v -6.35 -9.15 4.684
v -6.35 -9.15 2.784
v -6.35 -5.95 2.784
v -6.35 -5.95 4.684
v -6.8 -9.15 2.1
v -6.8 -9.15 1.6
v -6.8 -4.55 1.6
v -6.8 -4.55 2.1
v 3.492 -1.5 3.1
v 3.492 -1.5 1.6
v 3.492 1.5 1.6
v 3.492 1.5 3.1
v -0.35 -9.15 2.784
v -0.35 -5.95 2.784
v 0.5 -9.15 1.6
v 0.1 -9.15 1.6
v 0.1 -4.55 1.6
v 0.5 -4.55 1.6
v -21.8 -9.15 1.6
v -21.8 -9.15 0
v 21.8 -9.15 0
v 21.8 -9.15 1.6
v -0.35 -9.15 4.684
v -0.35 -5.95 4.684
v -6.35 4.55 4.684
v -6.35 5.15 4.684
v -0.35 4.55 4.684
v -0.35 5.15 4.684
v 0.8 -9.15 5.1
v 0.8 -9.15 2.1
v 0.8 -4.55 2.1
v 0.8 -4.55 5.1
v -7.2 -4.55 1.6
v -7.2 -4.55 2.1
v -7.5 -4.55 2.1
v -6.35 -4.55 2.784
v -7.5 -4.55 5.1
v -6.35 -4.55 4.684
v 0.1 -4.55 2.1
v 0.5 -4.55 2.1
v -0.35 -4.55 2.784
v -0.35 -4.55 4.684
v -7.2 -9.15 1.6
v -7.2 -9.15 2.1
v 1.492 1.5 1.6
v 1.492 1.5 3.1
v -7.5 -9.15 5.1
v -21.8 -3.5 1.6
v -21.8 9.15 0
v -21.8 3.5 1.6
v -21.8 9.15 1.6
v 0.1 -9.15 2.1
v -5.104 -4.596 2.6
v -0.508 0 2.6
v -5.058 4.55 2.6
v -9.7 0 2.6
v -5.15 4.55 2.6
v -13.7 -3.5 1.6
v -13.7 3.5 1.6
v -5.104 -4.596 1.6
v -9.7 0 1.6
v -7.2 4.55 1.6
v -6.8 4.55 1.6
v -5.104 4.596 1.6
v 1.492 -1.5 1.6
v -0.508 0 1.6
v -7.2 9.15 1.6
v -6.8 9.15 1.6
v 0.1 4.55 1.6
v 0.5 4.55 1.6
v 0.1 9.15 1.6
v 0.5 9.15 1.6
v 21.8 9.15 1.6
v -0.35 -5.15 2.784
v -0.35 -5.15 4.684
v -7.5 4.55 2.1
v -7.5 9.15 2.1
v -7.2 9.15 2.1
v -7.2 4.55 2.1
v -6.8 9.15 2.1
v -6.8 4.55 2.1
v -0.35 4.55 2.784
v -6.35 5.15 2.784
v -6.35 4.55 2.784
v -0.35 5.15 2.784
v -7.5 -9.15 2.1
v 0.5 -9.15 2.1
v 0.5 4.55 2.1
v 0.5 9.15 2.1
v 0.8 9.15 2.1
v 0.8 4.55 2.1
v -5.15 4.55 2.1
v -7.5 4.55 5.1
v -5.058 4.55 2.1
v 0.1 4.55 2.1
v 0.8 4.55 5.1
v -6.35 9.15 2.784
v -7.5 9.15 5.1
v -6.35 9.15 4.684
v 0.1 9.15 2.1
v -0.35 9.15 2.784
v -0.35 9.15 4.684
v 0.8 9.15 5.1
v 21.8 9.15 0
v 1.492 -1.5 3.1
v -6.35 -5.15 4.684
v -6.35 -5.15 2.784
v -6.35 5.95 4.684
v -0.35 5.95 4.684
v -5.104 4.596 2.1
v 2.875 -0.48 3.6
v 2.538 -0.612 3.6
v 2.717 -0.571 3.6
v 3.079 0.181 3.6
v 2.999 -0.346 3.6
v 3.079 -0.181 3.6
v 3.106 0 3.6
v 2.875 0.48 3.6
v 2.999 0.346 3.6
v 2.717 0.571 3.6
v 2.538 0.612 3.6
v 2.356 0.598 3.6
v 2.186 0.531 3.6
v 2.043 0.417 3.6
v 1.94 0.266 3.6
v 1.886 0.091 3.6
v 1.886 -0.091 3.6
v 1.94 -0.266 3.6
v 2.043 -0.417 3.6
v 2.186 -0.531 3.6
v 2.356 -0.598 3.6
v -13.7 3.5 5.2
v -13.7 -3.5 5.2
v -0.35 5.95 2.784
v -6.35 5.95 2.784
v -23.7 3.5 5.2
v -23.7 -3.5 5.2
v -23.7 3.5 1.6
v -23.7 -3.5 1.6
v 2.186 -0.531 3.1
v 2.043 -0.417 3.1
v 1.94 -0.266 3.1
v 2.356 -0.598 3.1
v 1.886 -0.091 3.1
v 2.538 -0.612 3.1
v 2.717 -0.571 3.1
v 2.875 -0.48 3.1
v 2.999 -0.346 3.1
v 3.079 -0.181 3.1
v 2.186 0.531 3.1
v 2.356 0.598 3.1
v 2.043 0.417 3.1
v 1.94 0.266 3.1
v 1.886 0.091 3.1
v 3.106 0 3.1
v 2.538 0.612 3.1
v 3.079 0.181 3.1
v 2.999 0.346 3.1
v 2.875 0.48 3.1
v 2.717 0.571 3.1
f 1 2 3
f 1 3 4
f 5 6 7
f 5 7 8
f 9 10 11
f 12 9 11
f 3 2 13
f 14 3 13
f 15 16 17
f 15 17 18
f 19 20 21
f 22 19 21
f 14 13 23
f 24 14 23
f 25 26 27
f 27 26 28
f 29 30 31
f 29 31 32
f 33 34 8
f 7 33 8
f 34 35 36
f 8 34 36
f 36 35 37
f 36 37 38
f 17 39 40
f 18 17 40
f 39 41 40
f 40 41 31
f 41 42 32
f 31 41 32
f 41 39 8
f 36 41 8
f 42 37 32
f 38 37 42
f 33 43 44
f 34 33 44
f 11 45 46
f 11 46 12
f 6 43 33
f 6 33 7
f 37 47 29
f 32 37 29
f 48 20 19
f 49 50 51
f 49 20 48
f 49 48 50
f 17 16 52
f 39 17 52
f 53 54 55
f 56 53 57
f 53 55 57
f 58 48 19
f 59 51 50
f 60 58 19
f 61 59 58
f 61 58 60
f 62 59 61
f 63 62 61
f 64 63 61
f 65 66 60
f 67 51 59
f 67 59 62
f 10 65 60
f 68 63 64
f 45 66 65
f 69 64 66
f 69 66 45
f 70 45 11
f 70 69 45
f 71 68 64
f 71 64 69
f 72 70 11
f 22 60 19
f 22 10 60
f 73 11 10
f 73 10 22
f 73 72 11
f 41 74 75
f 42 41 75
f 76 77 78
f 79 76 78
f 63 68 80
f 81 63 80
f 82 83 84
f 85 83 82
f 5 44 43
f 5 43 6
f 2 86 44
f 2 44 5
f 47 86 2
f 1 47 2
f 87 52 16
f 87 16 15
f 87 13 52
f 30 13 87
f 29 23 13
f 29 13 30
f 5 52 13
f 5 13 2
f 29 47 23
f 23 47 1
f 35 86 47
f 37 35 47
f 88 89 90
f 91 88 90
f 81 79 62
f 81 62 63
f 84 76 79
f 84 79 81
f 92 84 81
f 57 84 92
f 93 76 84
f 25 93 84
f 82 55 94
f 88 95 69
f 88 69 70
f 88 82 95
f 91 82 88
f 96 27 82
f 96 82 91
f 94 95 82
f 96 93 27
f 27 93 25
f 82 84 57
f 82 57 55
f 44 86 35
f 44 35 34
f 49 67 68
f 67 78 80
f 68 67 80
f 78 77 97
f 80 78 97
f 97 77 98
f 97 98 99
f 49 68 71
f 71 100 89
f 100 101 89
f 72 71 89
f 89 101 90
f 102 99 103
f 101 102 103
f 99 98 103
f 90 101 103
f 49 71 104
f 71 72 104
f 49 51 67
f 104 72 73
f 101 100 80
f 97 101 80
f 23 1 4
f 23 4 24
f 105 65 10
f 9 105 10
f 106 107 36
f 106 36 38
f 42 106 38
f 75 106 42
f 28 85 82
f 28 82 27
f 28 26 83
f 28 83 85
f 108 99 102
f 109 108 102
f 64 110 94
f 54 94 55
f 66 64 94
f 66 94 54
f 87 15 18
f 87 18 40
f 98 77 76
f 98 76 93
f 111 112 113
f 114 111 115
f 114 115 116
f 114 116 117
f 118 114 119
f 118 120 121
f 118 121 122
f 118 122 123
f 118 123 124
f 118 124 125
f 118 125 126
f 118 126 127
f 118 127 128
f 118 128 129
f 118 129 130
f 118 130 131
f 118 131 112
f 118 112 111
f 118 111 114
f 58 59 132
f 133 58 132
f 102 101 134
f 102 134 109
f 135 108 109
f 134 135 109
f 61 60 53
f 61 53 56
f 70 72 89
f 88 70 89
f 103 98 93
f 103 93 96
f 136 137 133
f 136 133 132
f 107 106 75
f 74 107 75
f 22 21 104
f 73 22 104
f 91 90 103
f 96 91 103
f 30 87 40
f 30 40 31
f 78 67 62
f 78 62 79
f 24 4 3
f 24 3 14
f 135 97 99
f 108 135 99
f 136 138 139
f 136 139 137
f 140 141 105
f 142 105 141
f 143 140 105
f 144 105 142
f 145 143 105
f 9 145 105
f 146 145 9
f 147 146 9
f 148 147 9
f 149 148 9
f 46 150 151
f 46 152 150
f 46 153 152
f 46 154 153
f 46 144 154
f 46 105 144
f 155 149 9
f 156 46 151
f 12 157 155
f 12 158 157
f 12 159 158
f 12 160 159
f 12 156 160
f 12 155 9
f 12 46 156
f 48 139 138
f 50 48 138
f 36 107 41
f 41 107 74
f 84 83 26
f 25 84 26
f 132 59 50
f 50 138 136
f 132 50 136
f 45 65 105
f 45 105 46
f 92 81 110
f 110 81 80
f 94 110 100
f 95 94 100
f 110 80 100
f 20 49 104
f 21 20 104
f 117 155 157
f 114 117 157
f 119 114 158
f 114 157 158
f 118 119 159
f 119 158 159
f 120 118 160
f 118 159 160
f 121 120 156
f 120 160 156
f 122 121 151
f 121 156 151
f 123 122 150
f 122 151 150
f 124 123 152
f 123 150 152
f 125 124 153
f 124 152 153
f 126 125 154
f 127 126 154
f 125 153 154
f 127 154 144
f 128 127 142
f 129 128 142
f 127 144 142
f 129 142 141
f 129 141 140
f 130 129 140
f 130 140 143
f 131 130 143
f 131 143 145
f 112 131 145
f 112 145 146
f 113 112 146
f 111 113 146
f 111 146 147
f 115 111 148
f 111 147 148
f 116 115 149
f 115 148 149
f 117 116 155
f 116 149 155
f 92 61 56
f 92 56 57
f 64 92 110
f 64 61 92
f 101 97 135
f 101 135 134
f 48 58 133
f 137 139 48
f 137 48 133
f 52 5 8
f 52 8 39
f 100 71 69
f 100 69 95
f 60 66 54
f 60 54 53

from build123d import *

# Parameters (mm, degrees)
SKETCH1_W            = 43.6
SKETCH1_H            = 18.3
BOSS_EXTRUDE1_DEPTH  = 1.6
USB_START            = 1.9
SKETCH2_W            = 3.6
SKETCH2_H            = 7
USB_CONNECTOR_DEPTH  = 10
MICROPROCESSOR_DEPTH = 1
SKETCH4_W            = 2
SKETCH4_H            = 3
BUTTON_BASE_DEPTH    = 1.5
SKETCH5_R            = 0.613578093
BUTTON_DEPTH         = 0.5
SKETCH6_W            = 8.3
SKETCH6_H            = 3
SKETCH6_W_2          = 6
SKETCH6_H_2          = 1.9
SKETCH6_W_3          = 0.4
SKETCH6_H_3          = 0.5
JST_X_6_DEPTH        = 4.6
BOSS_EXTRUDE8_START  = -4
SKETCH6_3_W          = 6
SKETCH6_3_H          = 1.9
BOSS_EXTRUDE8_DEPTH  = 0.8


with BuildPart() as part:
    # Sketch1 → Boss-Extrude1 (new body)
    with BuildSketch(Plane.XY):
        Rectangle(SKETCH1_W, SKETCH1_H)
    extrude(amount=BOSS_EXTRUDE1_DEPTH)

    # Sketch2 → USB Connector (add)
    with BuildSketch(Plane.ZY.offset(21.8).offset(USB_START)):
        with Locations((3.4, 0)):
            Rectangle(SKETCH2_W, SKETCH2_H)
    extrude(amount=-USB_CONNECTOR_DEPTH)

    # Sketch3 → MicroProcessor (add)
    with BuildSketch(Plane.XY.offset(1.6)):
        Polygon((-9.7, 0), (-5.103805922, 4.596194078), (-0.507611845, 0), (-5.103805922, -4.596194078), align=None)
    extrude(amount=MICROPROCESSOR_DEPTH)

    # Sketch4 → Button Base (add)
    with BuildSketch(Plane.XY.offset(1.6)):
        with Locations((2.492388155, 0)):
            Rectangle(SKETCH4_W, SKETCH4_H)
    extrude(amount=BUTTON_BASE_DEPTH)

    # Sketch5 → Button (add)
    with BuildSketch(Plane.XY.offset(3.1)):
        with Locations((2.492388155, 0)):
            Circle(SKETCH5_R)
    extrude(amount=BUTTON_DEPTH)


with BuildPart() as body_2:
    # Sketch6 → JST x 6 (new body)
    # profile 1 of 3: a face of its own
    with BuildSketch(Plane.XZ.offset(9.15)):
        with Locations((-3.35, 3.6)):
            Rectangle(SKETCH6_W, SKETCH6_H)
        with Locations((-3.35, 3.734337349)):
            Rectangle(SKETCH6_W_2, SKETCH6_H_2, mode=Mode.SUBTRACT)
    # profile 2 of 3: a face of its own
    with BuildSketch(Plane.XZ.offset(9.15)):
        with Locations((-7, 1.85)):
            Rectangle(SKETCH6_W_3, SKETCH6_H_3)
    # profile 3 of 3: a face of its own
    with BuildSketch(Plane.XZ.offset(9.15)):
        with Locations((0.3, 1.85)):
            Rectangle(SKETCH6_W_3, SKETCH6_H_3)
    jst_x_6 = extrude(amount=-JST_X_6_DEPTH)

    # Sketch6<3> → Boss-Extrude8 (add)
    with BuildSketch(Plane.XZ.offset(9.15).offset(BOSS_EXTRUDE8_START)):
        with Locations((-3.35, 3.734337349)):
            Rectangle(SKETCH6_3_W, SKETCH6_3_H)
    boss_extrude8 = extrude(amount=BOSS_EXTRUDE8_DEPTH)


with BuildPart() as part_1:
    add(part.part)

    # Mirror5: JST x 6, Boss-Extrude8 across plane
    add(jst_x_6.mirror(Plane.ZX))
    add(boss_extrude8.mirror(Plane.ZX))


solid = Compound([body_2.part, part_1.part])
